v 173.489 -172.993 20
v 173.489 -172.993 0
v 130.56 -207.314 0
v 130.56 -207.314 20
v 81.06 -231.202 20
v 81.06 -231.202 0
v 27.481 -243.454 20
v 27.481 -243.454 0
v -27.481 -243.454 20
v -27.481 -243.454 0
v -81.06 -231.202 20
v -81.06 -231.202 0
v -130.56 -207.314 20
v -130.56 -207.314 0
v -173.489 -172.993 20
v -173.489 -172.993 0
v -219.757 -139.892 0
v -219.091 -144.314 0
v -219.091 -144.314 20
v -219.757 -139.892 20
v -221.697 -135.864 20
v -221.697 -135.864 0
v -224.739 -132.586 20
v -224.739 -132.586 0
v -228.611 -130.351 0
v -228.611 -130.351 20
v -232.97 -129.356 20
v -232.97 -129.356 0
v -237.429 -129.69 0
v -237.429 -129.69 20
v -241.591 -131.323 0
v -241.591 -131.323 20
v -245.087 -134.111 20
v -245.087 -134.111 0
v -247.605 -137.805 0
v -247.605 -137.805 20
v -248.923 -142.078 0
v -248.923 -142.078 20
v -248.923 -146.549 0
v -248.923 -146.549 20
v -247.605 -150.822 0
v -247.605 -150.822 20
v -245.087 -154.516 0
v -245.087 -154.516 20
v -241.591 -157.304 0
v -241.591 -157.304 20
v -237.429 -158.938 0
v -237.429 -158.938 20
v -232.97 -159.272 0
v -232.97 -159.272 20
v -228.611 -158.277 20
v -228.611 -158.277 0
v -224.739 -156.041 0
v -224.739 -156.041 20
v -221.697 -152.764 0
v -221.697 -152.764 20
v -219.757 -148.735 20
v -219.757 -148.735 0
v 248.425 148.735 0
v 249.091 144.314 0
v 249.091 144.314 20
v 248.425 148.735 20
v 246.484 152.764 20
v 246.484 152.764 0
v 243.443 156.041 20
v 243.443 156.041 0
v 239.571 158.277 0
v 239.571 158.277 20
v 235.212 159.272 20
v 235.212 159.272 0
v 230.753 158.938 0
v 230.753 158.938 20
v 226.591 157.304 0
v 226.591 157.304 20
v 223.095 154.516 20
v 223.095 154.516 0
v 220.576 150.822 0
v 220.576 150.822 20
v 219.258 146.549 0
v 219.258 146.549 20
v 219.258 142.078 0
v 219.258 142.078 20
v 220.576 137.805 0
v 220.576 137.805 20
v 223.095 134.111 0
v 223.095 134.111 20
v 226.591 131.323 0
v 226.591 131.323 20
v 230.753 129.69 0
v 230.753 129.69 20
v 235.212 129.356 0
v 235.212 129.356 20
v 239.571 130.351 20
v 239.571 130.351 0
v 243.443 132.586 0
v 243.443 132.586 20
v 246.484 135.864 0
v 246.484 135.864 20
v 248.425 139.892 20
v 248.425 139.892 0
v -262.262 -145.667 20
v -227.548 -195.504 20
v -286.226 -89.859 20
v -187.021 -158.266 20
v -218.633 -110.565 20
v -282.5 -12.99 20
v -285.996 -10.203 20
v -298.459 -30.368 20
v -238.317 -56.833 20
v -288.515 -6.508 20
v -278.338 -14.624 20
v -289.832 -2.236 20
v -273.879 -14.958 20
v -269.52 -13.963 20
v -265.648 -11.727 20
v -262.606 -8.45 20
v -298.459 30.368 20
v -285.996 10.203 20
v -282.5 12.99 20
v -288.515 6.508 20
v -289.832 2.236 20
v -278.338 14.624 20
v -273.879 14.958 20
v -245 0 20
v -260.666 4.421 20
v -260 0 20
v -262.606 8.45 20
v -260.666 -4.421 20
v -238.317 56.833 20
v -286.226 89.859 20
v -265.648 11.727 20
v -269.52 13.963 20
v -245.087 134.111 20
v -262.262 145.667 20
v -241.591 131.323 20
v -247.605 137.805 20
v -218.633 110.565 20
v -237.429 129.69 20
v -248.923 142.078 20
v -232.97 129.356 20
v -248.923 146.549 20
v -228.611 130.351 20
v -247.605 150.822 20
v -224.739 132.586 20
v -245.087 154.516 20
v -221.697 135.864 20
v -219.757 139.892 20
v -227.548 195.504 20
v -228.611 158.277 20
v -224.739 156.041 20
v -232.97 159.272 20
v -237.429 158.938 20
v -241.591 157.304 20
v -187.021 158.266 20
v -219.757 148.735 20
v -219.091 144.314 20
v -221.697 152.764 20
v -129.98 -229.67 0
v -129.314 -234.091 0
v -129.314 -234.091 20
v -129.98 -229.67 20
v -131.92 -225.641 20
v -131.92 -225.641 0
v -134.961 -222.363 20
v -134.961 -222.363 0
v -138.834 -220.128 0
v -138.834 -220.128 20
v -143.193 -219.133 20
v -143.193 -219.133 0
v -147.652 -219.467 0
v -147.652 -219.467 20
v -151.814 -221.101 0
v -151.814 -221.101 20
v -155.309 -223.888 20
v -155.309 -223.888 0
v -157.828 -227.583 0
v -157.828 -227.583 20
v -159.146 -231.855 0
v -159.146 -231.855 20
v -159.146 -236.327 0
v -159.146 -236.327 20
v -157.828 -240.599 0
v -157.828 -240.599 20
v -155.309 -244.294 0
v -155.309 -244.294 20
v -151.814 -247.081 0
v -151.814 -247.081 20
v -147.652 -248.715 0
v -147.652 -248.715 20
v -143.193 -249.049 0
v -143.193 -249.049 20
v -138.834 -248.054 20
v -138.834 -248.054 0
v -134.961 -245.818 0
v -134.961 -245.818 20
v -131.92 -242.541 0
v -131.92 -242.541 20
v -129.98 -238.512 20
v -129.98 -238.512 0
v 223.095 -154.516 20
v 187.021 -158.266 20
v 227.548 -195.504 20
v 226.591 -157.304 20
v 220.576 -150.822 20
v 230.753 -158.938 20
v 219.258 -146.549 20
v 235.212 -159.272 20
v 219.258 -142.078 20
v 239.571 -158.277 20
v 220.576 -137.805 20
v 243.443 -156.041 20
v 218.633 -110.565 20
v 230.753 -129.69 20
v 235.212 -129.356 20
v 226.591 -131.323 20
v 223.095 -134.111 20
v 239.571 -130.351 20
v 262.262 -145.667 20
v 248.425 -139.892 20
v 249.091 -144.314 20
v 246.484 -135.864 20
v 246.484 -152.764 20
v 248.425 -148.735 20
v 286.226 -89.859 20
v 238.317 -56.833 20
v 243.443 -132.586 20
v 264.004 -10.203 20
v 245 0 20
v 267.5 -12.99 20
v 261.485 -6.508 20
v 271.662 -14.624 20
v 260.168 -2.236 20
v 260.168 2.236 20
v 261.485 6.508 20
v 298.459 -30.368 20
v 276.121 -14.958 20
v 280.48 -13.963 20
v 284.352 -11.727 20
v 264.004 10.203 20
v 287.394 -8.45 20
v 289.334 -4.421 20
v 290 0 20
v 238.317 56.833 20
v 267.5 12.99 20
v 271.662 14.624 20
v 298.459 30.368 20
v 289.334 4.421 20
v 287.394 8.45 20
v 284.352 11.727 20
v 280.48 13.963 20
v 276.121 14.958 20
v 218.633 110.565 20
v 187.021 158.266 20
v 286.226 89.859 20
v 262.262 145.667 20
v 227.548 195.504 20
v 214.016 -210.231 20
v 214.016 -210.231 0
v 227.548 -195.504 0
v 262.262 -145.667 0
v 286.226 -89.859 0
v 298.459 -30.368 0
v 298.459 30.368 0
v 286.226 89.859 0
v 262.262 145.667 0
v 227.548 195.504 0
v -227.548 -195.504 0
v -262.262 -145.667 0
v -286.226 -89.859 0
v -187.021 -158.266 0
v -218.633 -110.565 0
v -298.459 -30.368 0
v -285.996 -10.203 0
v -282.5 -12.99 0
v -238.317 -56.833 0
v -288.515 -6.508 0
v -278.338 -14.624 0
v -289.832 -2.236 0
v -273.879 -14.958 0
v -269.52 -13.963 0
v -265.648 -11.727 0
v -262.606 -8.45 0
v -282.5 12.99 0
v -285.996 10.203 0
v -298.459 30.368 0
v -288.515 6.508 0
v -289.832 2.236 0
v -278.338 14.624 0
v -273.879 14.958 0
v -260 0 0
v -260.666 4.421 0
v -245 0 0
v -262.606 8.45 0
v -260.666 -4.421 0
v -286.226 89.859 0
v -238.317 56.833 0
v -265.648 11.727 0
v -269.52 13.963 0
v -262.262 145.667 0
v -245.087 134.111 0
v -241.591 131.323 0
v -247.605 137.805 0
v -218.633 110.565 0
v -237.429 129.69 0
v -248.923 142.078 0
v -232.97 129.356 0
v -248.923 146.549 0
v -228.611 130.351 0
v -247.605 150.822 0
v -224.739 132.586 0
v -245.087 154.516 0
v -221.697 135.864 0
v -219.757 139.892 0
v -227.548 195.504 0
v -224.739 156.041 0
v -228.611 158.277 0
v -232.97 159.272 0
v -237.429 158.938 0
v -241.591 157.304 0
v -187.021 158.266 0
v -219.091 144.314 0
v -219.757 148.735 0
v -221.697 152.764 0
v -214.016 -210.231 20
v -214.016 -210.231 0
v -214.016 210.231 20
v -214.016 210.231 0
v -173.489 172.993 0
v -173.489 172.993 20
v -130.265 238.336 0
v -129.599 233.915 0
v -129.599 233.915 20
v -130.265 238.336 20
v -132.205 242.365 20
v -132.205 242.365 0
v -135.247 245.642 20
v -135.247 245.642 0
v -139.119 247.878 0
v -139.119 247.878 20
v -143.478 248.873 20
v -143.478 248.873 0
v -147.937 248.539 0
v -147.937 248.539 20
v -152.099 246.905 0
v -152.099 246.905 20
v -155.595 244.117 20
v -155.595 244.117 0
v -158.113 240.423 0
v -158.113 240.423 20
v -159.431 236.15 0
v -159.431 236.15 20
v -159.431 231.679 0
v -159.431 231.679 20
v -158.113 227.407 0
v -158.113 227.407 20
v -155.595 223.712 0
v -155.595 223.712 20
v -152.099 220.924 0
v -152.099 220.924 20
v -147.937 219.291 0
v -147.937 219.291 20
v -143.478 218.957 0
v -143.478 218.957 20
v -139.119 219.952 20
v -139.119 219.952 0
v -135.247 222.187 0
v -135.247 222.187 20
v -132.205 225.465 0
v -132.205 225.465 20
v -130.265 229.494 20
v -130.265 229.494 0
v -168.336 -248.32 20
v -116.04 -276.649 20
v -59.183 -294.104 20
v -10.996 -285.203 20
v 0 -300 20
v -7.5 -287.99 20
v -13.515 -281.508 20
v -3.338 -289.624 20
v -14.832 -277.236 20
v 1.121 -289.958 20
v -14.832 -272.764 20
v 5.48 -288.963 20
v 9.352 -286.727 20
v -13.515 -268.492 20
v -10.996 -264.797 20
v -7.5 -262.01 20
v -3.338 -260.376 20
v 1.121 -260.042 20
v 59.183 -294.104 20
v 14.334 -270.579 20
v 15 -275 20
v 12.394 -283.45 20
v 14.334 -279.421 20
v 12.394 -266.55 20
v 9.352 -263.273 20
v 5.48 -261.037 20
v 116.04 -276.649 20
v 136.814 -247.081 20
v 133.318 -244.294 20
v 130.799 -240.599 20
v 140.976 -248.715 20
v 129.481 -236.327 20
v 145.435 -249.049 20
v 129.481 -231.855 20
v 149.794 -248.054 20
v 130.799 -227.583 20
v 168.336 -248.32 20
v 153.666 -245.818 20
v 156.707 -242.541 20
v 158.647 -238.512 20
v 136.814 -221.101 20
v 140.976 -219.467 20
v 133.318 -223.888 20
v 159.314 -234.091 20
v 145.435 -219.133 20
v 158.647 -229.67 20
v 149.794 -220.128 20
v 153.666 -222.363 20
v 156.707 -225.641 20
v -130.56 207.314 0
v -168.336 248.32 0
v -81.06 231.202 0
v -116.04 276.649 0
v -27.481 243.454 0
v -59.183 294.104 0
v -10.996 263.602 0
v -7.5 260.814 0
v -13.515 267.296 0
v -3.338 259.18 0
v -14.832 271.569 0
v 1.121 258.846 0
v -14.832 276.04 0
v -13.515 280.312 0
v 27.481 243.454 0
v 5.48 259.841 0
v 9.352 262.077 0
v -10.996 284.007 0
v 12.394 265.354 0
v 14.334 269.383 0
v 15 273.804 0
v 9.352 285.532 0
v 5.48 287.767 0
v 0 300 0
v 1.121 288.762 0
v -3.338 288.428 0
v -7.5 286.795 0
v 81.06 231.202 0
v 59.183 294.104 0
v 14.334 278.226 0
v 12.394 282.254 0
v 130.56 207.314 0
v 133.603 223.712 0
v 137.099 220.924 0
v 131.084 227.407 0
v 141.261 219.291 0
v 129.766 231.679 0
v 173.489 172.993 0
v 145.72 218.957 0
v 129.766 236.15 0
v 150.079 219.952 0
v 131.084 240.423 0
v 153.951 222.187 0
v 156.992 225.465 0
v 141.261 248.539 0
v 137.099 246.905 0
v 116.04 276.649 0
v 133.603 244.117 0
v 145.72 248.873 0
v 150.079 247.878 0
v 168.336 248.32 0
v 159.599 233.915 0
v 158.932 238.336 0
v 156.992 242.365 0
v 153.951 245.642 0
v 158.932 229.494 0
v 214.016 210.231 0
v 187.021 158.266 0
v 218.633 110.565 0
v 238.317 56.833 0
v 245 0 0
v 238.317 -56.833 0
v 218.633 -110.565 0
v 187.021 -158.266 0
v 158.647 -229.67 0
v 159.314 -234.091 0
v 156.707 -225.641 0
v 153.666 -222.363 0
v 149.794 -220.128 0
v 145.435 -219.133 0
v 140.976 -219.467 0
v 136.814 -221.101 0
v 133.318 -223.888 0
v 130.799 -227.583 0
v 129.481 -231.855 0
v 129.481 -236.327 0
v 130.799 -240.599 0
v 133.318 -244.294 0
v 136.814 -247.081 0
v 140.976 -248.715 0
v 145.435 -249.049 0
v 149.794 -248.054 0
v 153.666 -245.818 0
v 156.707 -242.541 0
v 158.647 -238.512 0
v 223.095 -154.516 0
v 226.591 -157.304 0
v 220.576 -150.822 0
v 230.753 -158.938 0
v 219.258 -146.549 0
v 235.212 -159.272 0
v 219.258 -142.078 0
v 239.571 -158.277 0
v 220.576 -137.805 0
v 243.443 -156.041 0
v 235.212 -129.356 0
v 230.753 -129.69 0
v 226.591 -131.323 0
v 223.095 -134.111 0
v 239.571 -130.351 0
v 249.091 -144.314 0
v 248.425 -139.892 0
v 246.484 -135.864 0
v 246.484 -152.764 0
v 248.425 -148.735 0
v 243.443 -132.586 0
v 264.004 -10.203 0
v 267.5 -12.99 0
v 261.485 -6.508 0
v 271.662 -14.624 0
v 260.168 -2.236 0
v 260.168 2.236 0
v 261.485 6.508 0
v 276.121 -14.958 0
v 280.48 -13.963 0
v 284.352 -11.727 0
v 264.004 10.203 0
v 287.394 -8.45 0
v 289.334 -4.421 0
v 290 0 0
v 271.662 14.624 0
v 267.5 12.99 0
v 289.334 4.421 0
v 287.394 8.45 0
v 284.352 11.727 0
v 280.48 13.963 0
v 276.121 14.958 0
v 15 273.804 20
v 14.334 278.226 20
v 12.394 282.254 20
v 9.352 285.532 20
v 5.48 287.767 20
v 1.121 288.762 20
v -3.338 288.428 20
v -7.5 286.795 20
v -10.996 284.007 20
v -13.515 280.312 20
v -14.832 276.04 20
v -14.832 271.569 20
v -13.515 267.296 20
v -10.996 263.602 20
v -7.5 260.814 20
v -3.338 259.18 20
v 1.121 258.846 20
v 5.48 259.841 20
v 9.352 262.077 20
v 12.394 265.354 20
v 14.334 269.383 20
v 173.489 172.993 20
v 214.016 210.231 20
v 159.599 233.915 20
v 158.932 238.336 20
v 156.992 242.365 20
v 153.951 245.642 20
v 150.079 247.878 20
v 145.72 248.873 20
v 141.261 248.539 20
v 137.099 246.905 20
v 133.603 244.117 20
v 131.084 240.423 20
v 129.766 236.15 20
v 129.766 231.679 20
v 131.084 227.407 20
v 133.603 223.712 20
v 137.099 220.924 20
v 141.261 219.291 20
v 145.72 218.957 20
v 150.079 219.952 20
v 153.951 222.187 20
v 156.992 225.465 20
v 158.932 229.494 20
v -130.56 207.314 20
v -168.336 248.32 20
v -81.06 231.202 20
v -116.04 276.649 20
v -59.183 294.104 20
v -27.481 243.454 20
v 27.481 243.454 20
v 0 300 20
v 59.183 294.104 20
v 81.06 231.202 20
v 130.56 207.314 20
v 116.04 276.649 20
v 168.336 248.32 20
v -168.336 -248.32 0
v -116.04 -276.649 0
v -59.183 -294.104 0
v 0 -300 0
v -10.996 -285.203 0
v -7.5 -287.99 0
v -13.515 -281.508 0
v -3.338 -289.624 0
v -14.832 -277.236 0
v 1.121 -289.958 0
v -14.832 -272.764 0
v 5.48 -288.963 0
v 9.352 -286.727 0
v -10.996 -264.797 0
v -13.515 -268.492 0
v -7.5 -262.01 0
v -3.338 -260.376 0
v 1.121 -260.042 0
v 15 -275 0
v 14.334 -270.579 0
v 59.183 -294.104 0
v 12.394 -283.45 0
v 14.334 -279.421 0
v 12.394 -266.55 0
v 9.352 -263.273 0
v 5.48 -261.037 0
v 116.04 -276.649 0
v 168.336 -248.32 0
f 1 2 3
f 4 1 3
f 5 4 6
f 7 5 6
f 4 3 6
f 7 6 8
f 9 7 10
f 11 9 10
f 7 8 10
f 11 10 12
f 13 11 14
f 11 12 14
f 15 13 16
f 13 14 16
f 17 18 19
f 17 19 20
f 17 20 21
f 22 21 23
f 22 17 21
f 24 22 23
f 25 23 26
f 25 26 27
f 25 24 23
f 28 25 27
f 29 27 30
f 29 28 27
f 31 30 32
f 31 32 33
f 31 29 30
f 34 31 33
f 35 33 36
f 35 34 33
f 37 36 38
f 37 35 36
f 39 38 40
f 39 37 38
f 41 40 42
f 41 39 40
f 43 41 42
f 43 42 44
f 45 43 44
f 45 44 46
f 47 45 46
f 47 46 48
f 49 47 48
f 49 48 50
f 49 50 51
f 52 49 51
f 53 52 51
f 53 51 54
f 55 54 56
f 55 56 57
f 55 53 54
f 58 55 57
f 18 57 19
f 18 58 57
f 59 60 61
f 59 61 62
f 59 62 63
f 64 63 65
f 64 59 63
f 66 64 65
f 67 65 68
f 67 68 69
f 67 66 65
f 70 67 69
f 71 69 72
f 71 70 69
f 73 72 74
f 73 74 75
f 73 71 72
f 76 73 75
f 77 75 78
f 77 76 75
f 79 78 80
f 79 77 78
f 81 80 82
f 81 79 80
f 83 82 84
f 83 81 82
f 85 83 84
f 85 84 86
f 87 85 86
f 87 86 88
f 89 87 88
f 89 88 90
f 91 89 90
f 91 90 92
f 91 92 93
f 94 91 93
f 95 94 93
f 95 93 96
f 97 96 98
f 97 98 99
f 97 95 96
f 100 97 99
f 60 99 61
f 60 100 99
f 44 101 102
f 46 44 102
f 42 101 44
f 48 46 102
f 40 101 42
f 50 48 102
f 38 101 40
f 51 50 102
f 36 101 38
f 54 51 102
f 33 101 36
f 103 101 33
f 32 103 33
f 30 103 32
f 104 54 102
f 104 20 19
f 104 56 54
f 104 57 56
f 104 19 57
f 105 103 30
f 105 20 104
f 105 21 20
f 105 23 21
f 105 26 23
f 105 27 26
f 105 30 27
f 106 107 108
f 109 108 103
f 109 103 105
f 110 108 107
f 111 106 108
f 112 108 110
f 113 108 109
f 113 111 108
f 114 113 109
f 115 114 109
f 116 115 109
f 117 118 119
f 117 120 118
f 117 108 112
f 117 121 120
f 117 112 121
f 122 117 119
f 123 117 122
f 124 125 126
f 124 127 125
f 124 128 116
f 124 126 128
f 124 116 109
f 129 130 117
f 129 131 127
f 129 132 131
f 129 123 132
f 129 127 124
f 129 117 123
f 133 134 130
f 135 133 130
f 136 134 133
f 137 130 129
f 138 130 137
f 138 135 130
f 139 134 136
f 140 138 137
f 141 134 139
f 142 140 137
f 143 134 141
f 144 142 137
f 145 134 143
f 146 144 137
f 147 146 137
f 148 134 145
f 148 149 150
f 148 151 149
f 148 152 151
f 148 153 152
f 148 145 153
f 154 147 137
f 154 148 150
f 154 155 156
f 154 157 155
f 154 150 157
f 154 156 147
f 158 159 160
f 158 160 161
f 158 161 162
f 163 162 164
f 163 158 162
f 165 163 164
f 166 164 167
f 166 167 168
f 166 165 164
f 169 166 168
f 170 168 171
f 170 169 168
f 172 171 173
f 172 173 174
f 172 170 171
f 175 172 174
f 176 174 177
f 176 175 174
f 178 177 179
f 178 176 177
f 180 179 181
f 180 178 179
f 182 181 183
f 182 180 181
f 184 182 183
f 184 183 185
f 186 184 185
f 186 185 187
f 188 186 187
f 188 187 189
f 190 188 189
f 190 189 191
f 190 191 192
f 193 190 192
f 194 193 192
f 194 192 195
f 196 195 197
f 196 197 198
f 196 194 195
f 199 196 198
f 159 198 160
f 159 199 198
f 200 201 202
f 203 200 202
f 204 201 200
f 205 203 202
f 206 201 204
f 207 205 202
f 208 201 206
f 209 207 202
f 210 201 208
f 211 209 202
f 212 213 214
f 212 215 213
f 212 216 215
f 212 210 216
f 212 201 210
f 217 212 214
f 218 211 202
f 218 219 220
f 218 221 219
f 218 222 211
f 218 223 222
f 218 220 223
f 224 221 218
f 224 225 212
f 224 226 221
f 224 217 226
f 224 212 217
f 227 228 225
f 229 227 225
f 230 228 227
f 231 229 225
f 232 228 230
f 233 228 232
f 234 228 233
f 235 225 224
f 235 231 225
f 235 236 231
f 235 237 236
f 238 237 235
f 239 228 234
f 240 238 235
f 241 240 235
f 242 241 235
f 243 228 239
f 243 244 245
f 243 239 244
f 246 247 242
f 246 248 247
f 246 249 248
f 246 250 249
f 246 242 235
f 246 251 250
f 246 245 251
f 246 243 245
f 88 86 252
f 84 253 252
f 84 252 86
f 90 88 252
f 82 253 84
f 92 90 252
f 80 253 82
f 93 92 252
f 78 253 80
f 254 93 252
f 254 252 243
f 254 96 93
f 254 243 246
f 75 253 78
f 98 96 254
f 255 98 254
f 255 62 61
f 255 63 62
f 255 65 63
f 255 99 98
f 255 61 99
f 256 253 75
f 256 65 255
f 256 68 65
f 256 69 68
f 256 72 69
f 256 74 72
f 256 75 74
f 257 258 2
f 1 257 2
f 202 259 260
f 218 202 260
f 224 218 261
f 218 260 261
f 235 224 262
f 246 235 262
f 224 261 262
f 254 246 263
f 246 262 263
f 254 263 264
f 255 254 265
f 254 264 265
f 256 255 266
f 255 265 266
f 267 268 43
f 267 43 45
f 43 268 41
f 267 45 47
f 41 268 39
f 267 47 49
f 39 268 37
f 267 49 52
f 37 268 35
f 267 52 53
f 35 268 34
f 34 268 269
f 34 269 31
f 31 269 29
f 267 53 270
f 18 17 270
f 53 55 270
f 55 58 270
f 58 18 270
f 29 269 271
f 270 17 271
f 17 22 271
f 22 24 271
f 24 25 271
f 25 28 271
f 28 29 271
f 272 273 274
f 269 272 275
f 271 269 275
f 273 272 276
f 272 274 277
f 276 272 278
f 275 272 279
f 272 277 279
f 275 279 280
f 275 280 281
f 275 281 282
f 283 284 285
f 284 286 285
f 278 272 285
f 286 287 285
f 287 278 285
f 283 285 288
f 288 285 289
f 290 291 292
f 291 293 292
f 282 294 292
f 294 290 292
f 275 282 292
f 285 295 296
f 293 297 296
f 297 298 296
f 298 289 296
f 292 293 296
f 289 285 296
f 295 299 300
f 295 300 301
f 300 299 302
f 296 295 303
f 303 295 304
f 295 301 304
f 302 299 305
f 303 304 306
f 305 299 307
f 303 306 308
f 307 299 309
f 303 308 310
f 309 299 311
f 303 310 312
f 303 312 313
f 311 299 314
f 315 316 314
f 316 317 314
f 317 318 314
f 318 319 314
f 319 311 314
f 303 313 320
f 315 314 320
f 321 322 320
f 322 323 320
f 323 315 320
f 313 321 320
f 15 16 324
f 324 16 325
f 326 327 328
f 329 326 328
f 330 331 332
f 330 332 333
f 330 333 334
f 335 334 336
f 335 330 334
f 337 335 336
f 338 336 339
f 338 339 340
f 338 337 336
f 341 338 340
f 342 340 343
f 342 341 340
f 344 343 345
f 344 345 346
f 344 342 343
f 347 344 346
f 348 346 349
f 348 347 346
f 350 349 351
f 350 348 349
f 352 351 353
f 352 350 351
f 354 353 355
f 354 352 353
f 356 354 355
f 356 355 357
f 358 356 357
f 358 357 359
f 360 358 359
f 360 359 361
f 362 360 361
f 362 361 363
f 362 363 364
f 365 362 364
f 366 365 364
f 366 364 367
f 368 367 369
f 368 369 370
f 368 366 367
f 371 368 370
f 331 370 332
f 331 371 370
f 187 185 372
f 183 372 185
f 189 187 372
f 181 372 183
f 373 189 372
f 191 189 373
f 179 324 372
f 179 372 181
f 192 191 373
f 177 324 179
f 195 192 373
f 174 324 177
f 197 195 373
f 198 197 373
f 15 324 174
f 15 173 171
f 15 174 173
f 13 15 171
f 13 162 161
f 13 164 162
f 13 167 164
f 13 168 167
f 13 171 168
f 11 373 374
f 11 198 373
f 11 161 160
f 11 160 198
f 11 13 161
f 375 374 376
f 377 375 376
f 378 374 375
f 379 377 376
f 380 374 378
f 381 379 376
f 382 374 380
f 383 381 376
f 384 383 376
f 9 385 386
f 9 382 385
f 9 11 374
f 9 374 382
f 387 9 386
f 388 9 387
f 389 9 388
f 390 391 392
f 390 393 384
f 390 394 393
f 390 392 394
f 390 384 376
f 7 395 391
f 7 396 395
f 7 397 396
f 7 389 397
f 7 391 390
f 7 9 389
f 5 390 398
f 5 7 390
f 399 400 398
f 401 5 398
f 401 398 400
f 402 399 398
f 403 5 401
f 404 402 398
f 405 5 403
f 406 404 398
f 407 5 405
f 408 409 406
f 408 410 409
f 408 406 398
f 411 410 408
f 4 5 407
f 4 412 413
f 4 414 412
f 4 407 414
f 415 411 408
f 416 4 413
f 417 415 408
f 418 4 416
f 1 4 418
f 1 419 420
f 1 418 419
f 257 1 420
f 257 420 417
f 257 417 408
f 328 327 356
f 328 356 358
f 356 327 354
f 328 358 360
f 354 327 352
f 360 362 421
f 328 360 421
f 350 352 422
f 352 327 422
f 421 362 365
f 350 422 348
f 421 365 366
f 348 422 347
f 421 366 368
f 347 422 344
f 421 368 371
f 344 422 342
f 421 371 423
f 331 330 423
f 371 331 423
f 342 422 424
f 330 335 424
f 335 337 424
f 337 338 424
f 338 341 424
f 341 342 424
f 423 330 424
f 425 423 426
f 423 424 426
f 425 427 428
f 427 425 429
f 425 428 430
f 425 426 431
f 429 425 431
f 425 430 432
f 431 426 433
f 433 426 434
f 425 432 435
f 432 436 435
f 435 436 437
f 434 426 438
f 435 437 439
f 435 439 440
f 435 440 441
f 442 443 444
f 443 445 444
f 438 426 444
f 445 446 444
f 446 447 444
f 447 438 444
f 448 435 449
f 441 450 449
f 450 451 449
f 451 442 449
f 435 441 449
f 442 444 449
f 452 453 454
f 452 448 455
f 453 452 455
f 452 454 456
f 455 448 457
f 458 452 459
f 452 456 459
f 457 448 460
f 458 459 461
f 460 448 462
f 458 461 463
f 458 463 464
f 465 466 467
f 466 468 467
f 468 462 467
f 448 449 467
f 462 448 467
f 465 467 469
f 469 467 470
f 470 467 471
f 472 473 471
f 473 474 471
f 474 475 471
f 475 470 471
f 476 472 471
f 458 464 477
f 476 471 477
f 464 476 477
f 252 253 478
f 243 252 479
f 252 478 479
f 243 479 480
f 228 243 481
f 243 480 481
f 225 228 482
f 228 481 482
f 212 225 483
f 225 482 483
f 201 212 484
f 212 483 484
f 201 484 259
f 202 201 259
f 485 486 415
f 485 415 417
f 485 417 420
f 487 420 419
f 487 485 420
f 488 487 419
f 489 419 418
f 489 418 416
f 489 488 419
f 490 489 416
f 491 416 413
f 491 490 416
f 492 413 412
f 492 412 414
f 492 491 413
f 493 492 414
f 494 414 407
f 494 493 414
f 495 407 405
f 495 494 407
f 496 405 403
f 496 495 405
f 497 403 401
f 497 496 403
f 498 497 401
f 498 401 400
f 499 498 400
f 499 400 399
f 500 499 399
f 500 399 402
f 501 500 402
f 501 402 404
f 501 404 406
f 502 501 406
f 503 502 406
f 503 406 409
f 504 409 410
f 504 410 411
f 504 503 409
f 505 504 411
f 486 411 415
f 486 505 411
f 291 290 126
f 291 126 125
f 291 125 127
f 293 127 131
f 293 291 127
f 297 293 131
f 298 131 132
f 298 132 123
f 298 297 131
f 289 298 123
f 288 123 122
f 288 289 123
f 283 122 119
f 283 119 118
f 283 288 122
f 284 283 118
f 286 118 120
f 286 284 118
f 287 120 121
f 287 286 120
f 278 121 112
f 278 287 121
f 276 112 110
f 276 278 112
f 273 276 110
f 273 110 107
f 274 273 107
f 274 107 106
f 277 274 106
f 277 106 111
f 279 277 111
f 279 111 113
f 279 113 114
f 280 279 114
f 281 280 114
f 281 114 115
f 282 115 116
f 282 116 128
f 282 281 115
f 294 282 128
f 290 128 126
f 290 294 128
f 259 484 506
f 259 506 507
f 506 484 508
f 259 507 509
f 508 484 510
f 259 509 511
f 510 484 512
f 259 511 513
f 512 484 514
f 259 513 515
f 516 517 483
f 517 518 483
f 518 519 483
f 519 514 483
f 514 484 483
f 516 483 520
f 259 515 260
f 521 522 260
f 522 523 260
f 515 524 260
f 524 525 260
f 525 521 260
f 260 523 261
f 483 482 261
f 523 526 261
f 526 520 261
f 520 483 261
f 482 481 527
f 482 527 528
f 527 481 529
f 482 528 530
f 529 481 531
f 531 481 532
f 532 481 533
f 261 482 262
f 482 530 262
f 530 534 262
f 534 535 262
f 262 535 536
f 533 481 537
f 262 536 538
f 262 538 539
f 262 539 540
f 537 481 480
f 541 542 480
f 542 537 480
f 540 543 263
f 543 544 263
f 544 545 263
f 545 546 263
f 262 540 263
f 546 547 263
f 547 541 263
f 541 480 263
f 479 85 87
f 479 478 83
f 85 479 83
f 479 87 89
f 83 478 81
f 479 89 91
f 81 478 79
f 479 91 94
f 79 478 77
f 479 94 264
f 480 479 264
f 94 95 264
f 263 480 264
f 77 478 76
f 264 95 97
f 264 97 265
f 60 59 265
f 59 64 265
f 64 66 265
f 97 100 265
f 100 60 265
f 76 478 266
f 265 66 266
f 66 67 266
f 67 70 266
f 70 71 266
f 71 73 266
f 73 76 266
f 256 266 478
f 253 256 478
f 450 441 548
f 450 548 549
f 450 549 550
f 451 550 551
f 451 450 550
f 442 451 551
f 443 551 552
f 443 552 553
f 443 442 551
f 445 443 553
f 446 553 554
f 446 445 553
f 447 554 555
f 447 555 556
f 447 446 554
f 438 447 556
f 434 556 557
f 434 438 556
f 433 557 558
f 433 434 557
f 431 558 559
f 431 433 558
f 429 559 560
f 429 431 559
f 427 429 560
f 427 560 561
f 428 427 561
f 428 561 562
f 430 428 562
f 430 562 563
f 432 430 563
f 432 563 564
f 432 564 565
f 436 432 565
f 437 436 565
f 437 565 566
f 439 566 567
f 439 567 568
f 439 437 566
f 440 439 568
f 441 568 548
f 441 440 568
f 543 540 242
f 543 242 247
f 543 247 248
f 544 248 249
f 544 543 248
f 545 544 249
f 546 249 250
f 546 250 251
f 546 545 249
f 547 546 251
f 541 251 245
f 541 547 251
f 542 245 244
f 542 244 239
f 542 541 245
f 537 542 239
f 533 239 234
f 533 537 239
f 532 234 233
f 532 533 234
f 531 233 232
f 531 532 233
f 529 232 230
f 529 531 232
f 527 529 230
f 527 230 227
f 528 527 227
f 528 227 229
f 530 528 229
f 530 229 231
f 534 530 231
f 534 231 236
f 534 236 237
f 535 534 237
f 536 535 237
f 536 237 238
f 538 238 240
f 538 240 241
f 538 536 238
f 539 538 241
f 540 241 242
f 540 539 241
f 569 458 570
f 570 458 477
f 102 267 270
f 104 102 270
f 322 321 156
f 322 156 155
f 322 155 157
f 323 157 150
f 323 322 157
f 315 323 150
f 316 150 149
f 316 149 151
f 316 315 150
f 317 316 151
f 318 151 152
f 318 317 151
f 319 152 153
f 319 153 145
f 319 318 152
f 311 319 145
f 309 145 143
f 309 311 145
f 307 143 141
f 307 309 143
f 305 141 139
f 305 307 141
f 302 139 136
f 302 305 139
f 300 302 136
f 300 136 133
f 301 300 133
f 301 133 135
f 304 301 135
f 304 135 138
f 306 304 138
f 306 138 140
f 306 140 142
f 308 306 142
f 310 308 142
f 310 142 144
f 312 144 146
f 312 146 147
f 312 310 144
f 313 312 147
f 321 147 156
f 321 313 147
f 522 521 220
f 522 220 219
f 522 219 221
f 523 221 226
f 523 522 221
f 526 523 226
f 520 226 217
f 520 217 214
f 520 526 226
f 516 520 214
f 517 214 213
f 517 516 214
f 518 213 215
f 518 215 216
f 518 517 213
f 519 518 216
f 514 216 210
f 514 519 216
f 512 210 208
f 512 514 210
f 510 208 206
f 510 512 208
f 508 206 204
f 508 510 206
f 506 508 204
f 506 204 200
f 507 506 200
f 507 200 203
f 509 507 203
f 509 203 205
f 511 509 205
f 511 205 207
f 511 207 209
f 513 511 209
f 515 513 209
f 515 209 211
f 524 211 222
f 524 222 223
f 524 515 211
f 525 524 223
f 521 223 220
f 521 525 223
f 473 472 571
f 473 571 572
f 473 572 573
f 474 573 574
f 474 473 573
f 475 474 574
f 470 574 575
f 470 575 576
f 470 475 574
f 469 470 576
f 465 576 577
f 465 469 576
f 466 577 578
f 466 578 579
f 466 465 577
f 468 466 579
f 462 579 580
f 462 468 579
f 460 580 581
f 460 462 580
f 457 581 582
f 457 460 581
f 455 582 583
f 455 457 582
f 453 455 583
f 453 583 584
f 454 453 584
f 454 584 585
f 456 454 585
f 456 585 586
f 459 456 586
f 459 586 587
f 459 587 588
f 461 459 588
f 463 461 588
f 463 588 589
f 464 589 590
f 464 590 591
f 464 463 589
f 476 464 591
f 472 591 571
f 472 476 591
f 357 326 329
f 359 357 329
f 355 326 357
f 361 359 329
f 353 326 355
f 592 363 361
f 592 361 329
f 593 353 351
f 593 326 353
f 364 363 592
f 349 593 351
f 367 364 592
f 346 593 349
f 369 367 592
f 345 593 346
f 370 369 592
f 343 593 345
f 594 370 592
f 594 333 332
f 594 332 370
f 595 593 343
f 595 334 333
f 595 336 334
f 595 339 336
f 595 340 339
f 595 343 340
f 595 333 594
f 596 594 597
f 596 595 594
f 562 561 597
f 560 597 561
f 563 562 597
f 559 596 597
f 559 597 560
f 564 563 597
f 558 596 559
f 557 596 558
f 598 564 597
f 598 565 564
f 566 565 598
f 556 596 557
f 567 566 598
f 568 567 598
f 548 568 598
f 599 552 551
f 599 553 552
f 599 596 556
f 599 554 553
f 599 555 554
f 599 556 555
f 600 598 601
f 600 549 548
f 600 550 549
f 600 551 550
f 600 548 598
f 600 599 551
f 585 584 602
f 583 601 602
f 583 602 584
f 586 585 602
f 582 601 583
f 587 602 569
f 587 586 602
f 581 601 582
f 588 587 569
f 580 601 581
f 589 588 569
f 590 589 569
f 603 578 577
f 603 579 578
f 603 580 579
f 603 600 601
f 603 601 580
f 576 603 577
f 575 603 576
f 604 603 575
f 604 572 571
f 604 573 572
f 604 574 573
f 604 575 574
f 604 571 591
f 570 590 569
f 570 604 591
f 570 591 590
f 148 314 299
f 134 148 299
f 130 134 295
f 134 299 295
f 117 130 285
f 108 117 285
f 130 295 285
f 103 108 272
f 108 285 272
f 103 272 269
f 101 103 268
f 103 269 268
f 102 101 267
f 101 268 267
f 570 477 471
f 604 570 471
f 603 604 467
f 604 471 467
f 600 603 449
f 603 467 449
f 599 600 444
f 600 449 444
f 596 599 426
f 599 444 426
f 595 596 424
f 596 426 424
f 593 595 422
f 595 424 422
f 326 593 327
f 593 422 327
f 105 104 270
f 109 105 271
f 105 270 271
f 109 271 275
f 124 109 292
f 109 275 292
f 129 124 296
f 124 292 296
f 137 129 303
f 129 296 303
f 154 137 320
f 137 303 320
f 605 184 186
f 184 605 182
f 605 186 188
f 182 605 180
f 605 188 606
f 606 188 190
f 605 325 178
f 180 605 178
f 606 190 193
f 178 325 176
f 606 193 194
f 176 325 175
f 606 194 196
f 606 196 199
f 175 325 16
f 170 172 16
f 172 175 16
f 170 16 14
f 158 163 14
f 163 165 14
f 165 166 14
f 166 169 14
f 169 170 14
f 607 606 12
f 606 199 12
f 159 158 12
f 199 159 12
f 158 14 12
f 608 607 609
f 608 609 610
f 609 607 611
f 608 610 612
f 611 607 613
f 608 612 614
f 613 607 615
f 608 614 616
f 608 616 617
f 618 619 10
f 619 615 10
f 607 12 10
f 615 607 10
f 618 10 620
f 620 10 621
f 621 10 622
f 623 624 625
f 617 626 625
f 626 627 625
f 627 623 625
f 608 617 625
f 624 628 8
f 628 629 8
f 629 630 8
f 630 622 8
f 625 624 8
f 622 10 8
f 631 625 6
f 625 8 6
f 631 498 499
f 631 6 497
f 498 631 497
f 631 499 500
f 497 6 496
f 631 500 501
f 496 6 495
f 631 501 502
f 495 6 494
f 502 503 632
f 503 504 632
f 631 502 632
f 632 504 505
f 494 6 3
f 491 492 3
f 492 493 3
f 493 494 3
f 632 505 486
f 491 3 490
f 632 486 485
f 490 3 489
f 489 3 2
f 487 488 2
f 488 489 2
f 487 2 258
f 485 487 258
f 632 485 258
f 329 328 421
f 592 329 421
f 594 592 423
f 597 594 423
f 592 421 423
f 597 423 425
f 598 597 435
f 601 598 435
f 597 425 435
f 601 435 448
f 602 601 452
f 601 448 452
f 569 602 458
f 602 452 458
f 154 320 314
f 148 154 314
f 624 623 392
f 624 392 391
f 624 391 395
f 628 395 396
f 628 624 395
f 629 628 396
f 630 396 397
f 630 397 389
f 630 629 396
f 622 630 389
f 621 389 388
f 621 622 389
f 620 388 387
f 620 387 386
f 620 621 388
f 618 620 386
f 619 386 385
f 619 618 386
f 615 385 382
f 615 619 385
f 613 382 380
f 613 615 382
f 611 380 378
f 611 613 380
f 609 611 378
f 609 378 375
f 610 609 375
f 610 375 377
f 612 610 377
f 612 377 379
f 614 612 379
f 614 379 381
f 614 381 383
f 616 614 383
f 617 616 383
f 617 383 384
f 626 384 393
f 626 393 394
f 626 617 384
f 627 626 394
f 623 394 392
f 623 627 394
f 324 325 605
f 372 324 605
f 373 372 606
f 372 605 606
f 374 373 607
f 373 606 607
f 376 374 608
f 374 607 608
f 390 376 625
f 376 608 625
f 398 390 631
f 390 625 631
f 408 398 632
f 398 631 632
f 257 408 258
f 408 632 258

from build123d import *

# Parameters (mm, degrees)
IZIM1_R                       = 15
Y_KSEKLIK_EKSTR_ZYON1_DEPTH   = 20
Y_KSEKLIK_EKSTR_ZYON1_2_DEPTH = 20
Y_KSEKLIK_EKSTR_ZYON1_3_DEPTH = 20
Y_KSEKLIK_EKSTR_ZYON1_4_DEPTH = 20


with BuildPart() as part:
    # Çizim1 → Yükseklik-Ekstrüzyon1 (new body)
    with BuildSketch(Plane.XY):
        with BuildLine():
            Line((-187.021124904, 158.265911805), (-227.547884488, 195.504374031))
            ThreePointArc((-227.547884488, 195.504374031), (-300, 0), (-227.547884488, -195.504374031))
            Line((-227.547884488, -195.504374031), (-187.021124904, -158.265911805))
            ThreePointArc((-187.021124904, -158.265911805), (-245, 0), (-187.021124904, 158.265911805))
        make_face()
        with Locations((-234.090909091, -144.313707876)):
            Circle(IZIM1_R, mode=Mode.SUBTRACT)
        with Locations((-275, 0)):
            Circle(IZIM1_R, mode=Mode.SUBTRACT)
        with Locations((-234.090909091, 144.313707876)):
            Circle(IZIM1_R, mode=Mode.SUBTRACT)
    extrude(amount=Y_KSEKLIK_EKSTR_ZYON1_DEPTH)


with BuildPart() as body_2:
    # Çizim1 → Y_kseklik-Ekstr_zyon1 2 (new body)
    with BuildSketch(Plane.XY):
        with BuildLine():
            ThreePointArc((214.015840502, 210.23134879), (0, 300), (-214.015840502, 210.23134879))
            Line((-214.015840502, 210.23134879), (-173.489080919, 172.992886565))
            ThreePointArc((-173.489080919, 172.992886565), (0, 245), (173.489080919, 172.992886565))
            Line((173.489080919, 172.992886565), (214.015840502, 210.23134879))
        make_face()
        with Locations((-144.598899786, 233.914852416)):
            Circle(IZIM1_R, mode=Mode.SUBTRACT)
        with Locations((0, 273.804176558)):
            Circle(IZIM1_R, mode=Mode.SUBTRACT)
        with Locations((144.598899786, 233.914852416)):
            Circle(IZIM1_R, mode=Mode.SUBTRACT)
    extrude(amount=Y_KSEKLIK_EKSTR_ZYON1_2_DEPTH)


with BuildPart() as body_3:
    # Çizim1 → Y_kseklik-Ekstr_zyon1 3 (new body)
    with BuildSketch(Plane.XY):
        with BuildLine():
            ThreePointArc((227.547884488, -195.504374031), (300, 0), (227.547884488, 195.504374031))
            Line((227.547884488, 195.504374031), (187.021124904, 158.265911805))
            ThreePointArc((187.021124904, 158.265911805), (245, 0), (187.021124904, -158.265911805))
            Line((187.021124904, -158.265911805), (227.547884488, -195.504374031))
        make_face()
        with Locations((234.090909091, -144.313707876)):
            Circle(IZIM1_R, mode=Mode.SUBTRACT)
        with Locations((275, 0)):
            Circle(IZIM1_R, mode=Mode.SUBTRACT)
        with Locations((234.090909091, 144.313707876)):
            Circle(IZIM1_R, mode=Mode.SUBTRACT)
    extrude(amount=Y_KSEKLIK_EKSTR_ZYON1_3_DEPTH)


with BuildPart() as body_4:
    # Çizim1 → Y_kseklik-Ekstr_zyon1 4 (new body)
    with BuildSketch(Plane.XY):
        with BuildLine():
            ThreePointArc((-214.015840502, -210.23134879), (0, -300), (214.015840502, -210.23134879))
            Line((214.015840502, -210.23134879), (173.489080919, -172.992886565))
            ThreePointArc((173.489080919, -172.992886565), (0, -245), (-173.489080919, -172.992886565))
            Line((-173.489080919, -172.992886565), (-214.015840502, -210.23134879))
        make_face()
        with Locations((-144.313707876, -234.090909091)):
            Circle(IZIM1_R, mode=Mode.SUBTRACT)
        with Locations((0, -275)):
            Circle(IZIM1_R, mode=Mode.SUBTRACT)
        with Locations((144.313707876, -234.090909091)):
            Circle(IZIM1_R, mode=Mode.SUBTRACT)
    extrude(amount=Y_KSEKLIK_EKSTR_ZYON1_4_DEPTH)


solid = Compound([part.part, body_2.part, body_3.part, body_4.part])
